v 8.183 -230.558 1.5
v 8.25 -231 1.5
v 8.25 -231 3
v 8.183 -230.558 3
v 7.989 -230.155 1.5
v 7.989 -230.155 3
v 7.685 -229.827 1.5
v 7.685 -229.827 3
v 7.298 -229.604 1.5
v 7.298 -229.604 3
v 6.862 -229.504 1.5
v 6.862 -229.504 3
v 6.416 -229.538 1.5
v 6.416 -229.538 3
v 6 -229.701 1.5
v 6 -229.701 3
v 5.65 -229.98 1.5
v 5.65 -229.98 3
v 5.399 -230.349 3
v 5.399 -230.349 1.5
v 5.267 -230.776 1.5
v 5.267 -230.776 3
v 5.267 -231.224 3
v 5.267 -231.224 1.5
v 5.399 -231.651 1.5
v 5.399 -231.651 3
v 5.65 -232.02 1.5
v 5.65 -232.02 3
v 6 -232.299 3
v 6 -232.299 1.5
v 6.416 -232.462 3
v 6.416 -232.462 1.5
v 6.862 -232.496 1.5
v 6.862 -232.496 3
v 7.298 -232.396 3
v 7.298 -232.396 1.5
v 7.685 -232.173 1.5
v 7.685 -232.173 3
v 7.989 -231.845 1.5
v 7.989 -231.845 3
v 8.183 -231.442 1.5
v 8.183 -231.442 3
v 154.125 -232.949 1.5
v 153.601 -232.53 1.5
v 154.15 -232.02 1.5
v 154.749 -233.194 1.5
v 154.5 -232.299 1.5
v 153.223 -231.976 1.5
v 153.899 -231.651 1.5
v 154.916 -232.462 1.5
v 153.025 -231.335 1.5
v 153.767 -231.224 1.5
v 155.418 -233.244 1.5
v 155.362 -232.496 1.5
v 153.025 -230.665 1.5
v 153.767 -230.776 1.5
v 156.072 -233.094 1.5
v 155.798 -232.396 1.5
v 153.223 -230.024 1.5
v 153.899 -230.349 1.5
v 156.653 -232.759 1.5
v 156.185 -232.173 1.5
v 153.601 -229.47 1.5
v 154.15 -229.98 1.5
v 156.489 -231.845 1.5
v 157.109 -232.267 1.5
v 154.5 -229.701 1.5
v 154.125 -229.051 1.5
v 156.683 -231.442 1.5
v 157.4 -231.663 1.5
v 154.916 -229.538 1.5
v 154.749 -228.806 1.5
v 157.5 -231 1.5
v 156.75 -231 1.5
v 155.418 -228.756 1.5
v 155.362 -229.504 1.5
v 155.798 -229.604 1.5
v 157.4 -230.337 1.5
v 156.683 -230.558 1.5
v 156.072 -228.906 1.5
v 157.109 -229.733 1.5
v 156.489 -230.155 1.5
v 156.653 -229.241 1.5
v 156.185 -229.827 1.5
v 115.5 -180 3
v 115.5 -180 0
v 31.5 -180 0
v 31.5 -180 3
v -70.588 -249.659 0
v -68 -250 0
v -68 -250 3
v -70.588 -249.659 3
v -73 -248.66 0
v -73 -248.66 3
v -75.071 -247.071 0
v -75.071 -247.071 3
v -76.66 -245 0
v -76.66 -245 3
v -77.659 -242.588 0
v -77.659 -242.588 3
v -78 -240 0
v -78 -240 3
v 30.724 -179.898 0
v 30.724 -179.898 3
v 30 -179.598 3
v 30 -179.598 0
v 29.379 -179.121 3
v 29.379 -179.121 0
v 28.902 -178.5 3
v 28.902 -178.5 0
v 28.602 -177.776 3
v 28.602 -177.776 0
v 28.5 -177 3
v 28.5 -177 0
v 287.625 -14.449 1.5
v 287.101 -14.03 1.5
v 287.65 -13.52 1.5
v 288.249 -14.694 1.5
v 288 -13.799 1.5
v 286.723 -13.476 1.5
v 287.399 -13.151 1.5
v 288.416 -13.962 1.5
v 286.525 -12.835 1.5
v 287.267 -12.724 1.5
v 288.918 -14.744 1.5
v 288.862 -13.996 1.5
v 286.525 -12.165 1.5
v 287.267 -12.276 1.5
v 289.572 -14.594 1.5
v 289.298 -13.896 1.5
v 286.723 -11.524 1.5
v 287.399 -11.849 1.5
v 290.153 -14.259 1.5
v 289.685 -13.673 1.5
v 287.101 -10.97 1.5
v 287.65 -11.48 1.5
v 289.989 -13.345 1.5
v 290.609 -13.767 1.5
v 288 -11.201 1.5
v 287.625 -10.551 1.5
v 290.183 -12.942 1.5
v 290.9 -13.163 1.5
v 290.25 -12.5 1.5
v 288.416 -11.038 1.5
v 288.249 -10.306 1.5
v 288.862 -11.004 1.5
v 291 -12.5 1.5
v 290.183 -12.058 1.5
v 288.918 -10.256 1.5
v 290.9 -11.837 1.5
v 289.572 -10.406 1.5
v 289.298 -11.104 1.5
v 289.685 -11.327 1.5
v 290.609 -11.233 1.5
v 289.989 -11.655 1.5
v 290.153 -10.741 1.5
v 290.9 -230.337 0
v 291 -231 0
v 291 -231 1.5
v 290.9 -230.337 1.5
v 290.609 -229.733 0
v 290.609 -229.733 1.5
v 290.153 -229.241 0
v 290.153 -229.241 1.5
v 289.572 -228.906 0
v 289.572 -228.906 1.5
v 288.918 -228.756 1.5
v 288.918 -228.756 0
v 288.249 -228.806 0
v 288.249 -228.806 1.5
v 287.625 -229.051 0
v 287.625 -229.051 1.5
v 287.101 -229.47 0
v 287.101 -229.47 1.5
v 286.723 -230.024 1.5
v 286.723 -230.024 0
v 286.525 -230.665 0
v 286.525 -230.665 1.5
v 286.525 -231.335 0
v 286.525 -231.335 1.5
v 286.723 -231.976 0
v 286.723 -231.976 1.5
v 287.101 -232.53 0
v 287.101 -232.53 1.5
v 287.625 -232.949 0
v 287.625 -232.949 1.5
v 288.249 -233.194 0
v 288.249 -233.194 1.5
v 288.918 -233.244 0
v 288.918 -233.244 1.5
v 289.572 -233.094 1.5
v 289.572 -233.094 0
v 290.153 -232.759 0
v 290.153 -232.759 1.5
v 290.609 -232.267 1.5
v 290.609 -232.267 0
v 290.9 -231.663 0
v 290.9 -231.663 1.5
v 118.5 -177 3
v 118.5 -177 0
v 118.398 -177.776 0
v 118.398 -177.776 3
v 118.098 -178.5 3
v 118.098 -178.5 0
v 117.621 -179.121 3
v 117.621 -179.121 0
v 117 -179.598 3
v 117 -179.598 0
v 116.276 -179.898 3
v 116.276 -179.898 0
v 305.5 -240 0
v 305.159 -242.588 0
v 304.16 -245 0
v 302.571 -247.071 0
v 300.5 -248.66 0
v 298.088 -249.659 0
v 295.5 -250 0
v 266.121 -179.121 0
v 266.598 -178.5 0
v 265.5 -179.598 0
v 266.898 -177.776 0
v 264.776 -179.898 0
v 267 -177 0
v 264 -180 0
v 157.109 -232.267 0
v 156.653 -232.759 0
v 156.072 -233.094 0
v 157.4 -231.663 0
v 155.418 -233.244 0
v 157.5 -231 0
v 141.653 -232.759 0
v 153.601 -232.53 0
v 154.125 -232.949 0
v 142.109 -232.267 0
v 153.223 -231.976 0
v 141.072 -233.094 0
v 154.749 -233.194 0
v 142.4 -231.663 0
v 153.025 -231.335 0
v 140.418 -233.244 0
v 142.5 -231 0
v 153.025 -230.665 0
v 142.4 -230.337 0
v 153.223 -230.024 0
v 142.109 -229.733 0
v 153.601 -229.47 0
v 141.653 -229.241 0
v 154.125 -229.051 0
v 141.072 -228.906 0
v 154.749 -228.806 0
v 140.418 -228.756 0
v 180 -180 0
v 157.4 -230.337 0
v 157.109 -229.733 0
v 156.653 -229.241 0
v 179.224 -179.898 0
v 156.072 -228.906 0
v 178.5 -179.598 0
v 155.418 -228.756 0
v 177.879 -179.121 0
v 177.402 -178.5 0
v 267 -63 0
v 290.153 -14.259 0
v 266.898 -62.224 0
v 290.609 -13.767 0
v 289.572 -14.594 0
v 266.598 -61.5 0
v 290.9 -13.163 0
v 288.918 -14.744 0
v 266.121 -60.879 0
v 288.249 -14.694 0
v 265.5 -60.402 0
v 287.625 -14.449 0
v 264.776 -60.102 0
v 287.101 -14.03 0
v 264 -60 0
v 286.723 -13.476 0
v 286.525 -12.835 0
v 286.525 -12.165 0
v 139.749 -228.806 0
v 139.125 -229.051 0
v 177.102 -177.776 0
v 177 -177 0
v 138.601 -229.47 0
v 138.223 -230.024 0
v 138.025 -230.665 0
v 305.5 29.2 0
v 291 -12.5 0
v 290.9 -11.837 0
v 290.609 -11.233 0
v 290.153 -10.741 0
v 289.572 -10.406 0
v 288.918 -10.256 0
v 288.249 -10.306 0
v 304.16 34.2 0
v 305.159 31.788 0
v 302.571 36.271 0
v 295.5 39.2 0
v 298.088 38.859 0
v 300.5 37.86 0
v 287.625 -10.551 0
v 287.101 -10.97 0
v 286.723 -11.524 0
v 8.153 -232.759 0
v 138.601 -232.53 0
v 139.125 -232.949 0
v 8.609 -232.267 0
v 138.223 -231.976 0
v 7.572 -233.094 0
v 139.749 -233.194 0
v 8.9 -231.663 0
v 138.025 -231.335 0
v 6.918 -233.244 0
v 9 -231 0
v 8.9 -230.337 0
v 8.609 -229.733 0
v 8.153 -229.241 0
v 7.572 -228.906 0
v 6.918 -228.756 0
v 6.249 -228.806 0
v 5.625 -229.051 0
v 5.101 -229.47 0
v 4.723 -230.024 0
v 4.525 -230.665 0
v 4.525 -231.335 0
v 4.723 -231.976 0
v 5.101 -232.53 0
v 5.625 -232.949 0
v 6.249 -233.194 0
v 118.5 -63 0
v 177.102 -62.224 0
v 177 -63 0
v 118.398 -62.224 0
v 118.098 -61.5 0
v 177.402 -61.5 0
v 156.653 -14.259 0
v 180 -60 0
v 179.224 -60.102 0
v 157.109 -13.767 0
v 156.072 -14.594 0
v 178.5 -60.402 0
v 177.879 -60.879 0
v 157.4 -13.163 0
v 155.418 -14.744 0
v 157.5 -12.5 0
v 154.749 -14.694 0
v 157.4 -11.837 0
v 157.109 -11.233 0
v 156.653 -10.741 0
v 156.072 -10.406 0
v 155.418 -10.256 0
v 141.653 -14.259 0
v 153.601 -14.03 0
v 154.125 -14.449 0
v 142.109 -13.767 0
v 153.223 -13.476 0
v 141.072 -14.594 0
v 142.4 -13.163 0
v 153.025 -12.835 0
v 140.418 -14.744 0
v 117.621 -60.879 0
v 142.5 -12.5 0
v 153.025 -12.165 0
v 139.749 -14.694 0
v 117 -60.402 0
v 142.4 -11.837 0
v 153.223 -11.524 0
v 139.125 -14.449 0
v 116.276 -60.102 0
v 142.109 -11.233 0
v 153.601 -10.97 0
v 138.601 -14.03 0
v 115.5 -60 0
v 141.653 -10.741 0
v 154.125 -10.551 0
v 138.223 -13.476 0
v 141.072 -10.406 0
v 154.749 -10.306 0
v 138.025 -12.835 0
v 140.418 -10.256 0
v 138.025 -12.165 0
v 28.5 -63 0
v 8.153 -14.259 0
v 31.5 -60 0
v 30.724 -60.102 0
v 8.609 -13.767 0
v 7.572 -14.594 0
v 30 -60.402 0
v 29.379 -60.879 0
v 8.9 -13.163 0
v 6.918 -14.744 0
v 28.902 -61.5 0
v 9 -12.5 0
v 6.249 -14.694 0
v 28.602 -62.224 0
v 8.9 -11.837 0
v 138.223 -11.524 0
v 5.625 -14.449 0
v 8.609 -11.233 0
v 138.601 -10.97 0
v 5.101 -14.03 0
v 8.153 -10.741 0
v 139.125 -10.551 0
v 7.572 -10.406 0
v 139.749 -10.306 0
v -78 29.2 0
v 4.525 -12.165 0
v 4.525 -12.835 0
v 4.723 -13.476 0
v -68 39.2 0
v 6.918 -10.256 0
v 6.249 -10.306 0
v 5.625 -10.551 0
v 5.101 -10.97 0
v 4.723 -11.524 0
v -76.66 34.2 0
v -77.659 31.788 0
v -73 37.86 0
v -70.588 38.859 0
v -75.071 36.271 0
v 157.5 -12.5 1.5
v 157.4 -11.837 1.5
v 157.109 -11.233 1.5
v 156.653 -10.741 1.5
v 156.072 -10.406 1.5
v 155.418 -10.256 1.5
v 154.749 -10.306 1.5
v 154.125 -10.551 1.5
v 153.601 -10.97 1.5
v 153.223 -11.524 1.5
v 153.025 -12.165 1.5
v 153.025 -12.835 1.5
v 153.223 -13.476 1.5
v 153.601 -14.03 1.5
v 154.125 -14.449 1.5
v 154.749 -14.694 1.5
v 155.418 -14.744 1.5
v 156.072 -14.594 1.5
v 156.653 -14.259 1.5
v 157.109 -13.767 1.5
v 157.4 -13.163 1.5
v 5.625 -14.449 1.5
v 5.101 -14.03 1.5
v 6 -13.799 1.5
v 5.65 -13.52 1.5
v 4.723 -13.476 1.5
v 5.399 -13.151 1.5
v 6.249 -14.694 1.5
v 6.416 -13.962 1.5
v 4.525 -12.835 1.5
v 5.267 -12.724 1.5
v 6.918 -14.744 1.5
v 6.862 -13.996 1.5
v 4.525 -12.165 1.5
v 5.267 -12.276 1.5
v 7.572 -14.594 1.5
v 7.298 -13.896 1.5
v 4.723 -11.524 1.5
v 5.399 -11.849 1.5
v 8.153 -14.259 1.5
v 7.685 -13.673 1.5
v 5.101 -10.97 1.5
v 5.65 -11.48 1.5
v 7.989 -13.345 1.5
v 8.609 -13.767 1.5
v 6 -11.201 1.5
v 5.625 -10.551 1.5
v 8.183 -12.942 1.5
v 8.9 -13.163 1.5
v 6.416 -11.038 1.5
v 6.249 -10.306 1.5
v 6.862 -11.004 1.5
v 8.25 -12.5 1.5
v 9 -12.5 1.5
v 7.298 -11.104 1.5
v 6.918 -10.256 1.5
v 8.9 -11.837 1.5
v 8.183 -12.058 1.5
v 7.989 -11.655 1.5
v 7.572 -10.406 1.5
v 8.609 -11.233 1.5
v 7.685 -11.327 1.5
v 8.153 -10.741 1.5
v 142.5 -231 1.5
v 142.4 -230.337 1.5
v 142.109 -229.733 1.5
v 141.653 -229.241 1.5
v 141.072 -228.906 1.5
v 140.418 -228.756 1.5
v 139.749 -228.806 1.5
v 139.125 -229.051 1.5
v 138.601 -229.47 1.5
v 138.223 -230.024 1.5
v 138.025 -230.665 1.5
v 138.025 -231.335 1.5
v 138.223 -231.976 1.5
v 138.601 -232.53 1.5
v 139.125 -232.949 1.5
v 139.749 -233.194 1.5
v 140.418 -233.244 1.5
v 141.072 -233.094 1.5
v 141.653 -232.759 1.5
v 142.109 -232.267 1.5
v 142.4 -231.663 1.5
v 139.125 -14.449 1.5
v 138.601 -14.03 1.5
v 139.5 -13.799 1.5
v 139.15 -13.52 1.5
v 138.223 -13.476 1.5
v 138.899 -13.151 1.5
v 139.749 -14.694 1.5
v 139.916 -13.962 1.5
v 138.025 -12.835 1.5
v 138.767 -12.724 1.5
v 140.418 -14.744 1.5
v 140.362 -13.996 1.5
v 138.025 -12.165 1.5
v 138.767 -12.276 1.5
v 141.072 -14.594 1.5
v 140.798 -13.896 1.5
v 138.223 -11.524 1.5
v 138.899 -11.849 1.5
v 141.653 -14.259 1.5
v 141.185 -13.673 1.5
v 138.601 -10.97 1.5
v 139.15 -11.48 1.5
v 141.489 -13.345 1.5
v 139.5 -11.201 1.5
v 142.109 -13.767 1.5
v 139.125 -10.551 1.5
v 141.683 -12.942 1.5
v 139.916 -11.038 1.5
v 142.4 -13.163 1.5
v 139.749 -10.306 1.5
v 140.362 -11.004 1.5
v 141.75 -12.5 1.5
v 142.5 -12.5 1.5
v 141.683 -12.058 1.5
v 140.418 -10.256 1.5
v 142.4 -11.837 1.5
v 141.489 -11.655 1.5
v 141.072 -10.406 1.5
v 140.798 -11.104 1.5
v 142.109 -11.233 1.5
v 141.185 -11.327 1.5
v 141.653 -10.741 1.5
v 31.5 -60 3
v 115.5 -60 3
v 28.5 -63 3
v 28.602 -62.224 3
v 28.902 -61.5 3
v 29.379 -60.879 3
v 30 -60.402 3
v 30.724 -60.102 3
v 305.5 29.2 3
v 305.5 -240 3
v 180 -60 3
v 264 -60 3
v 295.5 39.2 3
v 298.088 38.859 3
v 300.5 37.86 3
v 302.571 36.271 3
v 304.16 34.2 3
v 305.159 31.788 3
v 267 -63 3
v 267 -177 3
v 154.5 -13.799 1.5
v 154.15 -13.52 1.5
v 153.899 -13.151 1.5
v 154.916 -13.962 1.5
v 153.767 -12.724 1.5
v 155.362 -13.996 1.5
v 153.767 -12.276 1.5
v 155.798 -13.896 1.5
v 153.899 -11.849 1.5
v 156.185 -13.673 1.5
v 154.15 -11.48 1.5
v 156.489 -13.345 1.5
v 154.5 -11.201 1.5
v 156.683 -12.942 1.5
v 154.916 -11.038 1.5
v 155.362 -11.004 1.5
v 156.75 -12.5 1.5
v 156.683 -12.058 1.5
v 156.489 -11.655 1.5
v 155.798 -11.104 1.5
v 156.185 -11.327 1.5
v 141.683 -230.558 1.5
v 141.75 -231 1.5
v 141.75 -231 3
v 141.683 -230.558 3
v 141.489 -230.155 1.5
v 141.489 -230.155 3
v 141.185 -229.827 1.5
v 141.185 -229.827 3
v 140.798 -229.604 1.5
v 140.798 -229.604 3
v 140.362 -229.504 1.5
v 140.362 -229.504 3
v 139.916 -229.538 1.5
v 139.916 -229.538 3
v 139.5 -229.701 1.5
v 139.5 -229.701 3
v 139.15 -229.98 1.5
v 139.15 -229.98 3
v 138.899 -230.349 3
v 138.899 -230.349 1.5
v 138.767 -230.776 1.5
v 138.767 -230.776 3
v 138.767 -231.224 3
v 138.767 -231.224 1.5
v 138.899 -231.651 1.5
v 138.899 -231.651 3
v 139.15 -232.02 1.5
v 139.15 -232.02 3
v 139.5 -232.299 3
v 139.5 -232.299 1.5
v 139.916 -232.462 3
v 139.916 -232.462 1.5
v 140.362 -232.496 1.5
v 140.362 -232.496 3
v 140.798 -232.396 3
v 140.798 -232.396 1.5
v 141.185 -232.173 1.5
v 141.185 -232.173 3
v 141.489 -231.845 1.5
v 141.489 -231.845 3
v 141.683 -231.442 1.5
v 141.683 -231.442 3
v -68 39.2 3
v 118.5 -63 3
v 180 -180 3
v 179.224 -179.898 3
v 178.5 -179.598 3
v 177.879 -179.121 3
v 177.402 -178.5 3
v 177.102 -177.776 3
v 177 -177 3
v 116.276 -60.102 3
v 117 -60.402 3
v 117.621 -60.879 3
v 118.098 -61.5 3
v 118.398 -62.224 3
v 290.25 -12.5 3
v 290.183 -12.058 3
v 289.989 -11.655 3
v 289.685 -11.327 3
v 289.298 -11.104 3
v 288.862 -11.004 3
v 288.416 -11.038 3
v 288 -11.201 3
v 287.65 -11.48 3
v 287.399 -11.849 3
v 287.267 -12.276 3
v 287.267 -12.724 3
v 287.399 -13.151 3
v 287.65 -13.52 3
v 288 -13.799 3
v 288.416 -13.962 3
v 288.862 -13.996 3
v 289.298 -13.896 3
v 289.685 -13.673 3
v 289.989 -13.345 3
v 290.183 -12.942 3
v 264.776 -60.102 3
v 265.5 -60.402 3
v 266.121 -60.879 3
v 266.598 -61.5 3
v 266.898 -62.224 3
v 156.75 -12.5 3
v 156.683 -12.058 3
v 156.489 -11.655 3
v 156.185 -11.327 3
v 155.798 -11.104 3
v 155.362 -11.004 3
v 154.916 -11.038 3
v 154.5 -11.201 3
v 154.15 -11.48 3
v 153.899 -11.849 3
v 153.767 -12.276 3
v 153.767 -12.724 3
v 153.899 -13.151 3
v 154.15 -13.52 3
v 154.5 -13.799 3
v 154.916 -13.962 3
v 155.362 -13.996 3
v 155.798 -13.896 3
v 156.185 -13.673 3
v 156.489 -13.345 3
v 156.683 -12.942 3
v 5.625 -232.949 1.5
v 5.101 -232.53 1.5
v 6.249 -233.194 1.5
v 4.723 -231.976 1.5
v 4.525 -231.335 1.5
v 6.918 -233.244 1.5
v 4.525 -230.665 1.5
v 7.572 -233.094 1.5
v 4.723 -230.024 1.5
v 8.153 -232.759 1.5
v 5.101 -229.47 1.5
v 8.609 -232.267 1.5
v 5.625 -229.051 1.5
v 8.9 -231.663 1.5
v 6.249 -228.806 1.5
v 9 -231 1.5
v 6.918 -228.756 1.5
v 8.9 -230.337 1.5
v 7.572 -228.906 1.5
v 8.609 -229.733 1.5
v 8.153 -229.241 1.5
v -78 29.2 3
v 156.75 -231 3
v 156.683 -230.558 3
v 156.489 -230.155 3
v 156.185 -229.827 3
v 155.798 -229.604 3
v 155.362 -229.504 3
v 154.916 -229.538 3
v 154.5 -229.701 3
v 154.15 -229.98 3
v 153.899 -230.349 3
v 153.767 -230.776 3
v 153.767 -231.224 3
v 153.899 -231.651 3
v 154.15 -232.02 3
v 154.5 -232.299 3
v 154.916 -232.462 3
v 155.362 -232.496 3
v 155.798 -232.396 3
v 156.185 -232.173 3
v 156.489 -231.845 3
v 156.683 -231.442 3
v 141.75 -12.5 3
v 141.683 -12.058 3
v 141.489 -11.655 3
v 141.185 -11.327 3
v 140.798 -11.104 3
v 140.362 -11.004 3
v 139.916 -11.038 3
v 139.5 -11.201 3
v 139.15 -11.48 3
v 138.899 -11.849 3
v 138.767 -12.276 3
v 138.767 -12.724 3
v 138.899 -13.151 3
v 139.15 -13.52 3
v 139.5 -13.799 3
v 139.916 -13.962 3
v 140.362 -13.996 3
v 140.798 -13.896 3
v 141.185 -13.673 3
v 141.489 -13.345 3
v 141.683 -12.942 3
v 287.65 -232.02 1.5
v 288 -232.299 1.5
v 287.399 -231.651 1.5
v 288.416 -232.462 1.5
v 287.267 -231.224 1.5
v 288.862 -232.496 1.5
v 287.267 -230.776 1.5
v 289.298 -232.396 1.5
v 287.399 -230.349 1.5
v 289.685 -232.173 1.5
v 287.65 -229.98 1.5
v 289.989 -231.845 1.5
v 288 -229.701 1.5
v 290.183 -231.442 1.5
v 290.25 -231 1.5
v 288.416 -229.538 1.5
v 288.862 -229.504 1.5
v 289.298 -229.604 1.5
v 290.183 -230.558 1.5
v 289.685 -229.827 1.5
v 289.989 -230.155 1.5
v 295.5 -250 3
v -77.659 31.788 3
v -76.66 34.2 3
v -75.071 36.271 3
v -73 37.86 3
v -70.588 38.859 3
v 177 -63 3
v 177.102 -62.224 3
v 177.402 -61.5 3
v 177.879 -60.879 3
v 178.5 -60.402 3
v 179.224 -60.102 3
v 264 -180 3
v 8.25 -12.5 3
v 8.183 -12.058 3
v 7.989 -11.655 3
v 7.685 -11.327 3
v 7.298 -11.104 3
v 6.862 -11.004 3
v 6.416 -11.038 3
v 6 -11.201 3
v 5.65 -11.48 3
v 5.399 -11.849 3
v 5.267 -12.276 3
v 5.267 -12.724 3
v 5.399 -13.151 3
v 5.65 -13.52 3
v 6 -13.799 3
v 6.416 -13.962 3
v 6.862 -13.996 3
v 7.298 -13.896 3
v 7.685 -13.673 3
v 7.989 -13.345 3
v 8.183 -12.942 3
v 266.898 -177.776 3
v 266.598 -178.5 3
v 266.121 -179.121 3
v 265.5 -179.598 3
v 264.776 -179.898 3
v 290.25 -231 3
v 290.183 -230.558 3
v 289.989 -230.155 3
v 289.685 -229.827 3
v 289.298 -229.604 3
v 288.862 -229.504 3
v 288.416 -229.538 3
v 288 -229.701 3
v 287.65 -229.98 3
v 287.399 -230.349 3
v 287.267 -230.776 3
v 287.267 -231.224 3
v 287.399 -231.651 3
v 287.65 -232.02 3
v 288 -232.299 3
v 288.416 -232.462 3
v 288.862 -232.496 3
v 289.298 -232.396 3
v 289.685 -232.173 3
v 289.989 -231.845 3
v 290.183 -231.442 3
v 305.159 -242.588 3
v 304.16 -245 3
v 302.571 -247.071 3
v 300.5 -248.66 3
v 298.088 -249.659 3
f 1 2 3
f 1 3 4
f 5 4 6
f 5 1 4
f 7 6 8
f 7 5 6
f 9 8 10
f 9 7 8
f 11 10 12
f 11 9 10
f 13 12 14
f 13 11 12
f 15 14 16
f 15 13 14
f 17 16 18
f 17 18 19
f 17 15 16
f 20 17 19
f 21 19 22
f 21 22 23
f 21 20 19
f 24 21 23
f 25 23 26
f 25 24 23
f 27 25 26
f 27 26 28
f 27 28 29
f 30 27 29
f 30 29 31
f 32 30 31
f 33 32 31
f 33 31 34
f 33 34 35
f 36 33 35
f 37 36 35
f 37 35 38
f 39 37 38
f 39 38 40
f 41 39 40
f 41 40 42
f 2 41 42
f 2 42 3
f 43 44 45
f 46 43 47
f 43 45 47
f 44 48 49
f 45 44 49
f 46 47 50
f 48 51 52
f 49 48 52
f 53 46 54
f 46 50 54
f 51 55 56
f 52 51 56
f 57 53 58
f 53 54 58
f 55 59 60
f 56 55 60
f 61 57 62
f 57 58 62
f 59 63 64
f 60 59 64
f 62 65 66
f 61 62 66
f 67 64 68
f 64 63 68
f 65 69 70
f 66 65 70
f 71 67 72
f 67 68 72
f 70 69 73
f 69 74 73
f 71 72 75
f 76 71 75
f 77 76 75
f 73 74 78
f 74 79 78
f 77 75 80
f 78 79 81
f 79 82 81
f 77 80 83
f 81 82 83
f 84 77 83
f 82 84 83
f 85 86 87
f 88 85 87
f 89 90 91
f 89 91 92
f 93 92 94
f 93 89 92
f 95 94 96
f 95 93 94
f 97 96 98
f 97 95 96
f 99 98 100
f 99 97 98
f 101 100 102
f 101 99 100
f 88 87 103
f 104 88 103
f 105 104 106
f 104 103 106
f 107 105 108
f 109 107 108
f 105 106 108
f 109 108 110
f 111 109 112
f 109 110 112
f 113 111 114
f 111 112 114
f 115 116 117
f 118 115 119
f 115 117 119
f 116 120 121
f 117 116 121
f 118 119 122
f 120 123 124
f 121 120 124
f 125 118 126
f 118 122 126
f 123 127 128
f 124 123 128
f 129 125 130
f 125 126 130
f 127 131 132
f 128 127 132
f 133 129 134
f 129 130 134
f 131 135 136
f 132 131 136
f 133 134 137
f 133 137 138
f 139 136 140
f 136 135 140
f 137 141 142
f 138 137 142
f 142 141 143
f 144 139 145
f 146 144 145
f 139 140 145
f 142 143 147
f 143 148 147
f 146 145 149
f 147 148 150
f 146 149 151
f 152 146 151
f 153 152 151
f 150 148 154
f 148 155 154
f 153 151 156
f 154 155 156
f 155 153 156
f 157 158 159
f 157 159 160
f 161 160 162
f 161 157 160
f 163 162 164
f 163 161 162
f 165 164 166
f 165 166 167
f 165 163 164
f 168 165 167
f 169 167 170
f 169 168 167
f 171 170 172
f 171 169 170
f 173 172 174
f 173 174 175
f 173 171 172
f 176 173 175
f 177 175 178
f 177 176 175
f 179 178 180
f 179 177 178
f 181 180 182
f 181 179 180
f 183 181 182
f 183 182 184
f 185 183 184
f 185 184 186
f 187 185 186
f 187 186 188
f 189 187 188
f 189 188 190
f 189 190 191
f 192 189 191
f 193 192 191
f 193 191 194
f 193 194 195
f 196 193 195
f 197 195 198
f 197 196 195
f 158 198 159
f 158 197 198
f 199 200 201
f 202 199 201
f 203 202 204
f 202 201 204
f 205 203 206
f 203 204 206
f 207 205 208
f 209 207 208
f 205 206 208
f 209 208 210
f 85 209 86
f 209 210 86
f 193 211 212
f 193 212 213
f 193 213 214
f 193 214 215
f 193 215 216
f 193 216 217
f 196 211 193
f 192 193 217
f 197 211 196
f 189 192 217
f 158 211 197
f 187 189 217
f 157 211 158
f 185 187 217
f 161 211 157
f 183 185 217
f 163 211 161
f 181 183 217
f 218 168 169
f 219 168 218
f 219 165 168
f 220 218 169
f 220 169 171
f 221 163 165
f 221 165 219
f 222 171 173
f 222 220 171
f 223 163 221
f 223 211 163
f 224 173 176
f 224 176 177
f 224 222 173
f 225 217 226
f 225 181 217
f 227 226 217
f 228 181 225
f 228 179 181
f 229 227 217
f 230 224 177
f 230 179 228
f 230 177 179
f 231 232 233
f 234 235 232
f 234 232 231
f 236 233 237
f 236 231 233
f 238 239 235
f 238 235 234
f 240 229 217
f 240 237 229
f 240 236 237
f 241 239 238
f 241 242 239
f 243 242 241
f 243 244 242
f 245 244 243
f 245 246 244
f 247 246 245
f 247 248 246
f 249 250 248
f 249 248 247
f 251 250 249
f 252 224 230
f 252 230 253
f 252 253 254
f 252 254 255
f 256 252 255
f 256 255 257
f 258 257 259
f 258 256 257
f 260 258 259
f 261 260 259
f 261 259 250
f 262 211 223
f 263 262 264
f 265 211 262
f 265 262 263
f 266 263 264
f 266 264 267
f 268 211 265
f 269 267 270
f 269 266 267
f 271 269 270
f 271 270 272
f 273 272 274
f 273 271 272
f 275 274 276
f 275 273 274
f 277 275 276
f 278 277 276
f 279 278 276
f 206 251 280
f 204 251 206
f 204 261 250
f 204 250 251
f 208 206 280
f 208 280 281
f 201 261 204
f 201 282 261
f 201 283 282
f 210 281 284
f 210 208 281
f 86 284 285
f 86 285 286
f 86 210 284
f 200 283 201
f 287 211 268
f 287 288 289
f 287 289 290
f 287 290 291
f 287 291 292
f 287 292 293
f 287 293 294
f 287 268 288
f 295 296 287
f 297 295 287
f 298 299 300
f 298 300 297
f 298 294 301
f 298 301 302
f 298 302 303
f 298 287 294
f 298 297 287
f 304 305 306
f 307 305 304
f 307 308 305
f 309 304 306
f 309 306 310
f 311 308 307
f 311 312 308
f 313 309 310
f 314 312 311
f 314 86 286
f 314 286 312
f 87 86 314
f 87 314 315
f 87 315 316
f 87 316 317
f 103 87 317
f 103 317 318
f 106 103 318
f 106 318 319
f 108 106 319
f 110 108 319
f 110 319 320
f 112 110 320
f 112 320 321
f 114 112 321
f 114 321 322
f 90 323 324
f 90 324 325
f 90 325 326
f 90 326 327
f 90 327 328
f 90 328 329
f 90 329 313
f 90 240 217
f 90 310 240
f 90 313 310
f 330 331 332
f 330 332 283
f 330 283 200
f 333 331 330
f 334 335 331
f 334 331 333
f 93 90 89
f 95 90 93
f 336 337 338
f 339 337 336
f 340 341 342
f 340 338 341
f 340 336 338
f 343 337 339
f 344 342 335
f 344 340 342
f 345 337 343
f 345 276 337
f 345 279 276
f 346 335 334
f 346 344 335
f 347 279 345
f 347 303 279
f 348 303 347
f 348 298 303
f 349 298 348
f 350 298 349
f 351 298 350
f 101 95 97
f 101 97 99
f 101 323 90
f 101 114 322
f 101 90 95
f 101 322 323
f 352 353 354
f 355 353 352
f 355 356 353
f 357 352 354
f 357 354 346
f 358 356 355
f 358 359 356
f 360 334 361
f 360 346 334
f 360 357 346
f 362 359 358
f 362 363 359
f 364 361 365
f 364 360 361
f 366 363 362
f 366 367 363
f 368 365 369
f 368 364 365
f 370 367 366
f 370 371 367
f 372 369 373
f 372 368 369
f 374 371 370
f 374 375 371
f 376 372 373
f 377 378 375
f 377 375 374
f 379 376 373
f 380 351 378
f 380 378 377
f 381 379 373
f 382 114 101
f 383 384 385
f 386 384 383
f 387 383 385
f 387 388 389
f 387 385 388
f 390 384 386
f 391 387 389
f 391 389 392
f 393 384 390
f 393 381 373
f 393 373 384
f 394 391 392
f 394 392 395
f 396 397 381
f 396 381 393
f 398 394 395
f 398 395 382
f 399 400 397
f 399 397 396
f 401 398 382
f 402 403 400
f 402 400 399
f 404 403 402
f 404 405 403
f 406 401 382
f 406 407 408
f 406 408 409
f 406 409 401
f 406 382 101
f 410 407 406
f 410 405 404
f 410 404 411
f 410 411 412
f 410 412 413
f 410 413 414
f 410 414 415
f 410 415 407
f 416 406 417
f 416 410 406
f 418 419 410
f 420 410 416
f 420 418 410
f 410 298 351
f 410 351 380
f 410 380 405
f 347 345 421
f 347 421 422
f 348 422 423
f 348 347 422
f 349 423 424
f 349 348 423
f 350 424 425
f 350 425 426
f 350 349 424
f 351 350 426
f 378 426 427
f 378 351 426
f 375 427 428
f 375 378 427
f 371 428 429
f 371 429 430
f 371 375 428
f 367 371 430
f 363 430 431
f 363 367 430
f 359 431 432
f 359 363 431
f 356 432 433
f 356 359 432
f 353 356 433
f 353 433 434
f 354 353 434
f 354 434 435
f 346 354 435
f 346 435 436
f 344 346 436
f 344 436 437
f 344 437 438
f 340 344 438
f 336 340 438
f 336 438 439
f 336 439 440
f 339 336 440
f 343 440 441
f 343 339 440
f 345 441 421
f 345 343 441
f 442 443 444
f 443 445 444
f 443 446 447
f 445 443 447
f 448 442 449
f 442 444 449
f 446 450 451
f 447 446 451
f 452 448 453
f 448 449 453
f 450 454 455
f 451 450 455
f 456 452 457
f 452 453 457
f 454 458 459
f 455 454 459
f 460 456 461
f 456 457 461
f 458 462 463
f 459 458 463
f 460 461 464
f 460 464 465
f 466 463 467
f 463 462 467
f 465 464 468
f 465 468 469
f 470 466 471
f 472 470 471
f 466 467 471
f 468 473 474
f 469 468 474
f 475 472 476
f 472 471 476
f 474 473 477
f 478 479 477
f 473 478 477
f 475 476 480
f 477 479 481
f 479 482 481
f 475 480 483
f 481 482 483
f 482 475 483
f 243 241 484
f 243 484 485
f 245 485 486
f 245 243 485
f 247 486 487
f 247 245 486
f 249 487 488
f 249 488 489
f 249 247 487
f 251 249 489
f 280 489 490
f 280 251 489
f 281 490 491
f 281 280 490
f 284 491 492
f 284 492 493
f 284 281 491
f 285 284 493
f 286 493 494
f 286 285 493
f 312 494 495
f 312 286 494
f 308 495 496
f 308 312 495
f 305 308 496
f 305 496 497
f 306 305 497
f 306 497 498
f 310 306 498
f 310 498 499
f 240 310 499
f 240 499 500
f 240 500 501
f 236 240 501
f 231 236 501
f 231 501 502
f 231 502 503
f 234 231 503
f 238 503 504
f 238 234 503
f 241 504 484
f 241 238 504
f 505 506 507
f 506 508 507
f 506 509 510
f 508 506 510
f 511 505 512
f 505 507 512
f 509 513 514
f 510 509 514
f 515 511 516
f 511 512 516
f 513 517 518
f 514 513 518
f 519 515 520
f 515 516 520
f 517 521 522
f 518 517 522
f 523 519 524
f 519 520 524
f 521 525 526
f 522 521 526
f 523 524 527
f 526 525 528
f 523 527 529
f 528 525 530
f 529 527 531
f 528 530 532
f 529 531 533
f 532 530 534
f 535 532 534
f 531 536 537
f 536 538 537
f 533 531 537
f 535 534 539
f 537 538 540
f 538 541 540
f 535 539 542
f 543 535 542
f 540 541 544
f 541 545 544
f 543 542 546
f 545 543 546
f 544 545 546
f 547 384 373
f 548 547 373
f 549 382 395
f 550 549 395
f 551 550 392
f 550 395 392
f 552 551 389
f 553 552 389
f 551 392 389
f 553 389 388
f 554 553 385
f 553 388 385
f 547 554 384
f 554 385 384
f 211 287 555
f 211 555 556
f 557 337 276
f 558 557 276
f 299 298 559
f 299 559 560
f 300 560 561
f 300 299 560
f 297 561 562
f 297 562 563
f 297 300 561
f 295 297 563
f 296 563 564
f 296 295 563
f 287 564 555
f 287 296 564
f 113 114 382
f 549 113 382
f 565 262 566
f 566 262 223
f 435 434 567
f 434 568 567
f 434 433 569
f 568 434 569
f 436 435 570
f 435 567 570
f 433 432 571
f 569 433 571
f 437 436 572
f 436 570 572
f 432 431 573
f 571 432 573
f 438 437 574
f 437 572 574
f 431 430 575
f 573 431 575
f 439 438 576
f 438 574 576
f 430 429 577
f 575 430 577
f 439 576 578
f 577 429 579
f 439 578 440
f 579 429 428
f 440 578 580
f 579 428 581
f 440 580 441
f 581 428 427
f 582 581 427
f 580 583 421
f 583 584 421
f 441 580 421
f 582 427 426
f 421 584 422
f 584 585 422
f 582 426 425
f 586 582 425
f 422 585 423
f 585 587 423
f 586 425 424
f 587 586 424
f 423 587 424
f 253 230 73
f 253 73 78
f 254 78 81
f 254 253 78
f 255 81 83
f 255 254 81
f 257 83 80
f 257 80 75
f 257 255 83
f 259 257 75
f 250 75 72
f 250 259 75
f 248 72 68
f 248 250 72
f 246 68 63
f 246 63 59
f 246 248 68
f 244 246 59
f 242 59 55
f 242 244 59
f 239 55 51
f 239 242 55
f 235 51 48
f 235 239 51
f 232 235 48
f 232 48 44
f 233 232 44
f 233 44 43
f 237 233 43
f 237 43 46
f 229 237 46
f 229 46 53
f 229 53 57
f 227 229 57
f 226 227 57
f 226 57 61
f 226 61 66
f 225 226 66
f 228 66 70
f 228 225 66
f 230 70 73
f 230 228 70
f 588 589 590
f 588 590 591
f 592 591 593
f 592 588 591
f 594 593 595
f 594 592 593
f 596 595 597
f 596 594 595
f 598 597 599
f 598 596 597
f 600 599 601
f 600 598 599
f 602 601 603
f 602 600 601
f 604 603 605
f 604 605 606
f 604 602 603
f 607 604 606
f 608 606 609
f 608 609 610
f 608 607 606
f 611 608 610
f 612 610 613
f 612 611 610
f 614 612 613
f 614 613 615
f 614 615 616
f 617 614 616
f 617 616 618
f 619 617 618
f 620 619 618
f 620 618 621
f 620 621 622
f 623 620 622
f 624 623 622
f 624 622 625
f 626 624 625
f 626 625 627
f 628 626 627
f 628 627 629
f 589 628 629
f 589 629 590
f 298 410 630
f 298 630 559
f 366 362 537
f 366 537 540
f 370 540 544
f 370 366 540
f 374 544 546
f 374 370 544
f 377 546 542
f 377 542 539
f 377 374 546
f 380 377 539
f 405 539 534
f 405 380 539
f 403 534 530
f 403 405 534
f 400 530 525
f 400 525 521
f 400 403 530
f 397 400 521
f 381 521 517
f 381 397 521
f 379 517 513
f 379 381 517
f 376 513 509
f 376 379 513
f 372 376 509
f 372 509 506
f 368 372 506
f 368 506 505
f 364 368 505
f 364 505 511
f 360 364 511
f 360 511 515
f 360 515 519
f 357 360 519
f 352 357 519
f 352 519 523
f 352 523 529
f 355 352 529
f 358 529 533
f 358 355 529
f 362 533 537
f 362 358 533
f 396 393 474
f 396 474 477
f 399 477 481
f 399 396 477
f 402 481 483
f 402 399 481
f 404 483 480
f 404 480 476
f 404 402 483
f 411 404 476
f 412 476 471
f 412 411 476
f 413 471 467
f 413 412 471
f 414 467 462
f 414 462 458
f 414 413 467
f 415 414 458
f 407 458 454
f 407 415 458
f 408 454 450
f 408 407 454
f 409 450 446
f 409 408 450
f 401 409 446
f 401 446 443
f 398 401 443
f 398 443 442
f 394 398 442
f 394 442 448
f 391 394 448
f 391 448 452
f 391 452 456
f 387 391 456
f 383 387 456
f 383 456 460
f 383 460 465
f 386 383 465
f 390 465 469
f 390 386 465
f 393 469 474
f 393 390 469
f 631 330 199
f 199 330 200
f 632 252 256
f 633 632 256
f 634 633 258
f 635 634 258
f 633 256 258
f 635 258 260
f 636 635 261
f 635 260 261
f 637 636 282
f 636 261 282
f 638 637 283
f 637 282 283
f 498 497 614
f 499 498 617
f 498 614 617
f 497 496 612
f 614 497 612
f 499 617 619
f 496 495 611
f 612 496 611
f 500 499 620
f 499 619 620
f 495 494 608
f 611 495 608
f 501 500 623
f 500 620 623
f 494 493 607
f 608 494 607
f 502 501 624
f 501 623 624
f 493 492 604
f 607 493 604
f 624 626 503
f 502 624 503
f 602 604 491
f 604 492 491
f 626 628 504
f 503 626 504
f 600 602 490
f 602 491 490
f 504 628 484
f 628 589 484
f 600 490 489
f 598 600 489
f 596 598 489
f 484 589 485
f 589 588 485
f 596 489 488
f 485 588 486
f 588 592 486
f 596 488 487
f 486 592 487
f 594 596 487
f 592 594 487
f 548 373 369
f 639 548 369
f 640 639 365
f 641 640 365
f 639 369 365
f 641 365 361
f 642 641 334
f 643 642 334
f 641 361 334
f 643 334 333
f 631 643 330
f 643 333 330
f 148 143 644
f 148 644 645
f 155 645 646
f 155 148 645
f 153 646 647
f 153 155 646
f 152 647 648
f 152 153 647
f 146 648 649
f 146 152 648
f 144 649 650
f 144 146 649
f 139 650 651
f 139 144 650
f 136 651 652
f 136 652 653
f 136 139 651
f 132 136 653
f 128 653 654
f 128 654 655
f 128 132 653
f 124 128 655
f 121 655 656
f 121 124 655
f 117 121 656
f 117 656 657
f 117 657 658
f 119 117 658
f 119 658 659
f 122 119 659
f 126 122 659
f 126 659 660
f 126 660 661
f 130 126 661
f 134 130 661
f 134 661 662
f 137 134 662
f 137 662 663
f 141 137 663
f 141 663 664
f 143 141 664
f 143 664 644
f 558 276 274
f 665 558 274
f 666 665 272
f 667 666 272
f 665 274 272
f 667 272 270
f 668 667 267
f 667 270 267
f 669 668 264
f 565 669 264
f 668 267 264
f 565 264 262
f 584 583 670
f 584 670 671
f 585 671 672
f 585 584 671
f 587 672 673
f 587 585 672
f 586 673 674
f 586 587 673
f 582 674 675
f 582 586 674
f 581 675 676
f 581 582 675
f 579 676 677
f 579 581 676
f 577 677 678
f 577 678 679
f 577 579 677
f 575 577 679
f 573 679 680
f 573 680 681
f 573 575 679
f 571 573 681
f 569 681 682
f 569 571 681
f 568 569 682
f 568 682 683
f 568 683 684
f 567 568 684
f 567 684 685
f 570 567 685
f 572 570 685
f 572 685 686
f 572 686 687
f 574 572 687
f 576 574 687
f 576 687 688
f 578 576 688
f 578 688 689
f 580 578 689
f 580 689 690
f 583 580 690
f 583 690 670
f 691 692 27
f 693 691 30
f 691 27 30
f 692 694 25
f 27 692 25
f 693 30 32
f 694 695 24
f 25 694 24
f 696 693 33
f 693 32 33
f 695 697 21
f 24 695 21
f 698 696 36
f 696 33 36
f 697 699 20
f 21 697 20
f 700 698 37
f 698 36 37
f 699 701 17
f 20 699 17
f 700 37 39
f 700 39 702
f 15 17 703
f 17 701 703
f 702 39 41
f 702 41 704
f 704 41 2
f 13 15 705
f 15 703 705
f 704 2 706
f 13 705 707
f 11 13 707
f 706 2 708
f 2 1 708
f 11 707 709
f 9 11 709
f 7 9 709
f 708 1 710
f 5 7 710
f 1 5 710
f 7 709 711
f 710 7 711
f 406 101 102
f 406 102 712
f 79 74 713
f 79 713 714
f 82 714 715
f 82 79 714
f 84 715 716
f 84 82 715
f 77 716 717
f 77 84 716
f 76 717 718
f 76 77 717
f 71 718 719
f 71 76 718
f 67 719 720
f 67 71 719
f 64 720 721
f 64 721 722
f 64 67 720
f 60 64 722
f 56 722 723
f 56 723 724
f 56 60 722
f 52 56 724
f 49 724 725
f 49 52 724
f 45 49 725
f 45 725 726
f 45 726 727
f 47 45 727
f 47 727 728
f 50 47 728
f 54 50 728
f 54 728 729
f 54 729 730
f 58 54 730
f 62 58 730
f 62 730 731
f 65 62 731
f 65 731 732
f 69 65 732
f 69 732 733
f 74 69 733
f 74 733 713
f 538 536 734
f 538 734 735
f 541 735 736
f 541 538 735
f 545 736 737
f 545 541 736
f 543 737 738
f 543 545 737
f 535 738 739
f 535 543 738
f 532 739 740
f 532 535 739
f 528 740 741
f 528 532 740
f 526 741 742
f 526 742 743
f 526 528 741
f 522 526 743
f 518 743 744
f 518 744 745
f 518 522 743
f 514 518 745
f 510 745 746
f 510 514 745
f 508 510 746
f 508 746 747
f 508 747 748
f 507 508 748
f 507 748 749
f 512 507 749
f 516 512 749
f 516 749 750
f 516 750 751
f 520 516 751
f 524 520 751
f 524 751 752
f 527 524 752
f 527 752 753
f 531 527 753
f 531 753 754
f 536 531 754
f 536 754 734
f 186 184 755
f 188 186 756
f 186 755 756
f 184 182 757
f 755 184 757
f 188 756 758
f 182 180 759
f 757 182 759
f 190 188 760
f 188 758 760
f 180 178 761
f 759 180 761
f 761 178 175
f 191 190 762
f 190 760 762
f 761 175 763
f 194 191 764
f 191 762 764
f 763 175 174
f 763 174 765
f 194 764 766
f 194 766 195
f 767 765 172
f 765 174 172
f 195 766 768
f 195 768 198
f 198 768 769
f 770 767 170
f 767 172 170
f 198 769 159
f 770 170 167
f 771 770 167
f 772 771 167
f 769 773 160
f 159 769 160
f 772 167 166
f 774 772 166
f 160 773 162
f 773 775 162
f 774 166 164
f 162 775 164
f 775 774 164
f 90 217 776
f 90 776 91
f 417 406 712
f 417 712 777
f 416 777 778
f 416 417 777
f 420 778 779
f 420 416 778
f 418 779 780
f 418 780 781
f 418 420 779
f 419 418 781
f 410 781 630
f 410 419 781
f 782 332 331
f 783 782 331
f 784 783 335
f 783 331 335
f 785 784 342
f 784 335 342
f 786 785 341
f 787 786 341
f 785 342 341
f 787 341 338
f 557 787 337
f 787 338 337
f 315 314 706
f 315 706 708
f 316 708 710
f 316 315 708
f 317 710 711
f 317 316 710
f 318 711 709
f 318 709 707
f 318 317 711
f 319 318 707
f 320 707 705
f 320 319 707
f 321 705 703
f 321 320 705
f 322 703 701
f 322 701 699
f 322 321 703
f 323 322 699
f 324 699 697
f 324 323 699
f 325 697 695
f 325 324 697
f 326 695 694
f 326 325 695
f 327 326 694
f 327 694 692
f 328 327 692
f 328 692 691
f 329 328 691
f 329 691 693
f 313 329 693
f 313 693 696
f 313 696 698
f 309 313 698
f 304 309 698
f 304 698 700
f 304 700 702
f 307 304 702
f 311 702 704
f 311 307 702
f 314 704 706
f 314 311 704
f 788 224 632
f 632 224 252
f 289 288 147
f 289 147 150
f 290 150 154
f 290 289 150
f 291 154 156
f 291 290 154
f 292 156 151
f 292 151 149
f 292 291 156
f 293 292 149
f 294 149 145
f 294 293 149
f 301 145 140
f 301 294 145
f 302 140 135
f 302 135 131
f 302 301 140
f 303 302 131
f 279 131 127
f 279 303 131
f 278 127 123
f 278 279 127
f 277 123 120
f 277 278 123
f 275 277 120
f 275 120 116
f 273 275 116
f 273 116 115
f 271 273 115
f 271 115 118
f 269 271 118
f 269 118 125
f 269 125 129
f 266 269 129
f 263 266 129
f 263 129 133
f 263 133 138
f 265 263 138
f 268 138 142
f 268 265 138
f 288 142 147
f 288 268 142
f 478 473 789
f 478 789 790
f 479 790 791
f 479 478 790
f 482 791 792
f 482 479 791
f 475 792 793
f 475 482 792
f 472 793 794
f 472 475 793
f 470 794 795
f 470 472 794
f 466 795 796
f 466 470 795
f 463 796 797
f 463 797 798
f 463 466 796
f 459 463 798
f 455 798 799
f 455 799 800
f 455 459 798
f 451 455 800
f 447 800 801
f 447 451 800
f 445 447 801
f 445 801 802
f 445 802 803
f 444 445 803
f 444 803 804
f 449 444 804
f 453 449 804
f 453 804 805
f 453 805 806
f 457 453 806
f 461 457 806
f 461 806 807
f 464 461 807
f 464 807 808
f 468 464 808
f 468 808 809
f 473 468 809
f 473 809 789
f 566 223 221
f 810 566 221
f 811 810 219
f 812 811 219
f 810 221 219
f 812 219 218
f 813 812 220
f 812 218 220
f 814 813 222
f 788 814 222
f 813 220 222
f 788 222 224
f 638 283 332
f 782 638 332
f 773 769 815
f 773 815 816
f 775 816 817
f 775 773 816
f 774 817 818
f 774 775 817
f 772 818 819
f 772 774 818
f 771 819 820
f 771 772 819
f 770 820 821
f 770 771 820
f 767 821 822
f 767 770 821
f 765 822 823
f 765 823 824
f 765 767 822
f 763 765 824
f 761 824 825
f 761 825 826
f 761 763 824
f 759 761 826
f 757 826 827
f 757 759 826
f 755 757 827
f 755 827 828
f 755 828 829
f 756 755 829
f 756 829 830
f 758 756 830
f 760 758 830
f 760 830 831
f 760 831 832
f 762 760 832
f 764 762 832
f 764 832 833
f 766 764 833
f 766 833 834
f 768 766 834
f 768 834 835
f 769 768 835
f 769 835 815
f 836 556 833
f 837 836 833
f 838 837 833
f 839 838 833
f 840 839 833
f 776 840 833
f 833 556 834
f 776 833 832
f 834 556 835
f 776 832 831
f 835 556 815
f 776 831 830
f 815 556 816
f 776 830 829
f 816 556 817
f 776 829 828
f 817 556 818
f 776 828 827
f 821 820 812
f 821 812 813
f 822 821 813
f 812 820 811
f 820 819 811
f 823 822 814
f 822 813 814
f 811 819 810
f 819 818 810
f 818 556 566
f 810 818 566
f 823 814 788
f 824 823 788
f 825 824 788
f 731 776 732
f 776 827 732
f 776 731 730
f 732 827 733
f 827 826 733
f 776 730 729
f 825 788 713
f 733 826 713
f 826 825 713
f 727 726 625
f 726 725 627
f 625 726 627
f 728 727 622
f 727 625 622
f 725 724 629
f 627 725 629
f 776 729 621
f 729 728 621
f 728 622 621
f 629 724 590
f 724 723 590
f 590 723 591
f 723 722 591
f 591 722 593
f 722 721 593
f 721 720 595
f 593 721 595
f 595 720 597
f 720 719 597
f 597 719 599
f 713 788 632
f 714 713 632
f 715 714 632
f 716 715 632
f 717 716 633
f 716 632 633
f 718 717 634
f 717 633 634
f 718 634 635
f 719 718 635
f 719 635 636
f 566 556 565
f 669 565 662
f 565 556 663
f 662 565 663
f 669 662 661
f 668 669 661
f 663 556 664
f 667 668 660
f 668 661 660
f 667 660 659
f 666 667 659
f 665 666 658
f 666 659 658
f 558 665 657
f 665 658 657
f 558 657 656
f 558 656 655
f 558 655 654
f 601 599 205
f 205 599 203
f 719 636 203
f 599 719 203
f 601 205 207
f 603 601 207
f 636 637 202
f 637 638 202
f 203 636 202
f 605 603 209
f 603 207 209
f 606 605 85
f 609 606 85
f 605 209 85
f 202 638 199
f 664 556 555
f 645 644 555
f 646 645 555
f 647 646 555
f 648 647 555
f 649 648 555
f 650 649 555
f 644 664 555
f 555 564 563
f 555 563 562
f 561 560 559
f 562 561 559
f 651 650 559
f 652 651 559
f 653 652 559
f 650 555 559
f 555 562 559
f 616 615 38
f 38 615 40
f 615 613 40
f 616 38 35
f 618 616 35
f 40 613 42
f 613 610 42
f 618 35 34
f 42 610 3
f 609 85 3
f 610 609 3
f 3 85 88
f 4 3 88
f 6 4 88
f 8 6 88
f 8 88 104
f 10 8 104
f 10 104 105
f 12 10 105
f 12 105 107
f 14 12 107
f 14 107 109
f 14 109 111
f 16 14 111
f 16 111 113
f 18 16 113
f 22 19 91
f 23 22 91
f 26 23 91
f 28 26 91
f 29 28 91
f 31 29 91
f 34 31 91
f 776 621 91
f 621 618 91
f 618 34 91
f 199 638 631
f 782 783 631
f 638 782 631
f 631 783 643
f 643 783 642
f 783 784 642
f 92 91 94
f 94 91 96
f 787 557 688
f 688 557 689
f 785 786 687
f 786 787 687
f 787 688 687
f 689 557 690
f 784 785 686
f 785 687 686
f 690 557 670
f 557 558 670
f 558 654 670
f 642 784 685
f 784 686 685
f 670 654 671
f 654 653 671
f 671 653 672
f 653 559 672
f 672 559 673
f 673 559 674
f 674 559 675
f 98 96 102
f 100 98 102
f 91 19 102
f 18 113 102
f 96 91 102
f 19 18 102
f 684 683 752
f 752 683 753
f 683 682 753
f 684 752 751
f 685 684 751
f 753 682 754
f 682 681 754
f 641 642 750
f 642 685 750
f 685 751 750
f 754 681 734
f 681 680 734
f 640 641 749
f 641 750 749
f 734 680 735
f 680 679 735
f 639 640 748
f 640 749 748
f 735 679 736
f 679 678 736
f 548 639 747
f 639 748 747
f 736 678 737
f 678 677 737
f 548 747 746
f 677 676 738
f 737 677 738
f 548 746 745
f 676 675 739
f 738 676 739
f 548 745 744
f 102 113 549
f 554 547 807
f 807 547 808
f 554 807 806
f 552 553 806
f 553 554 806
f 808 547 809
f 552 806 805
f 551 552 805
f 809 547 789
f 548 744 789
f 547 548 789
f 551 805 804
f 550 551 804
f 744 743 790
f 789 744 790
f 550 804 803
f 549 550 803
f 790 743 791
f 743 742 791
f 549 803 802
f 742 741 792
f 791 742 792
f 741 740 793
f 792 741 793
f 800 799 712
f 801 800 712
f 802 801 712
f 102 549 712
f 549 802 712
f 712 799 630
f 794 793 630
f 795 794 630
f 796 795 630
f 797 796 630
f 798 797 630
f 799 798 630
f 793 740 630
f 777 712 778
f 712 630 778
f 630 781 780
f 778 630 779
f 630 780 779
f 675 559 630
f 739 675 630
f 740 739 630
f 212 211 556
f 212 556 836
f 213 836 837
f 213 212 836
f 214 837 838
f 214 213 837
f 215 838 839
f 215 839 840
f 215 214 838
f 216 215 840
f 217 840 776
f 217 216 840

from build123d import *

# Parameters (mm, degrees)
EXTRUDE_1_DEPTH     = 3
SKETCH_1_3_R        = 2.25
CUT_EXTRUDE_1_DEPTH = 1.5
SKETCH_1_4_R        = 1.5
CUT_EXTRUDE_2_DEPTH = 3


with BuildPart() as part:
    # 草图1 → 凸台-拉伸1 (new body)
    with BuildSketch(Plane.XY):
        with BuildLine():
            Line((-68, 39.2), (295.5, 39.2))
            ThreePointArc((295.5, 39.2), (302.571067812, 36.271067812), (305.5, 29.2))
            Line((305.5, 29.2), (305.5, -240))
            ThreePointArc((305.5, -240), (302.571067812, -247.071067812), (295.5, -250))
            Line((295.5, -250), (-68, -250))
            ThreePointArc((-68, -250), (-75.071067812, -247.071067812), (-78, -240))
            Line((-78, -240), (-78, 29.2))
            ThreePointArc((-78, 29.2), (-75.071067812, 36.271067812), (-68, 39.2))
        make_face()
    extrude(amount=EXTRUDE_1_DEPTH)

    # 草图1<3> → 切除-拉伸1 (cut)
    with BuildSketch(Plane.XY):
        with Locations((6.75, -12.5)):
            Circle(SKETCH_1_3_R)
        with Locations((140.25, -12.5)):
            Circle(SKETCH_1_3_R)
        with Locations((140.25, -231)):
            Circle(SKETCH_1_3_R)
        with Locations((6.75, -231)):
            Circle(SKETCH_1_3_R)
        with Locations((155.25, -12.5)):
            Circle(SKETCH_1_3_R)
        with Locations((288.75, -12.5)):
            Circle(SKETCH_1_3_R)
        with Locations((288.75, -231)):
            Circle(SKETCH_1_3_R)
        with Locations((155.25, -231)):
            Circle(SKETCH_1_3_R)
    extrude(amount=CUT_EXTRUDE_1_DEPTH, mode=Mode.SUBTRACT)

    # 草图1<4> → 切除-拉伸2 (cut)
    with BuildSketch(Plane.XY):
        with Locations((6.75, -12.5)):
            Circle(SKETCH_1_4_R)
        with Locations((140.25, -12.5)):
            Circle(SKETCH_1_4_R)
        with Locations((140.25, -231)):
            Circle(SKETCH_1_4_R)
        with Locations((6.75, -231)):
            Circle(SKETCH_1_4_R)
        with Locations((155.25, -12.5)):
            Circle(SKETCH_1_4_R)
        with Locations((288.75, -12.5)):
            Circle(SKETCH_1_4_R)
        with Locations((288.75, -231)):
            Circle(SKETCH_1_4_R)
        with Locations((155.25, -231)):
            Circle(SKETCH_1_4_R)
        with BuildLine():
            Line((31.5, -60), (115.5, -60))
            ThreePointArc((115.5, -60), (117.621320344, -60.878679656), (118.5, -63))
            Line((118.5, -63), (118.5, -177))
            ThreePointArc((118.5, -177), (117.621320344, -179.121320344), (115.5, -180))
            Line((115.5, -180), (31.5, -180))
            ThreePointArc((31.5, -180), (29.378679656, -179.121320344), (28.5, -177))
            Line((28.5, -177), (28.5, -63))
            ThreePointArc((28.5, -63), (29.378679656, -60.878679656), (31.5, -60))
        make_face()
        with BuildLine():
            Line((180, -60), (264, -60))
            ThreePointArc((264, -60), (266.121320344, -60.878679656), (267, -63))
            Line((267, -63), (267, -177))
            ThreePointArc((267, -177), (266.121320344, -179.121320344), (264, -180))
            Line((264, -180), (180, -180))
            ThreePointArc((180, -180), (177.878679656, -179.121320344), (177, -177))
            Line((177, -177), (177, -63))
            ThreePointArc((177, -63), (177.878679656, -60.878679656), (180, -60))
        make_face()
    extrude(amount=CUT_EXTRUDE_2_DEPTH, mode=Mode.SUBTRACT)


solid = part.part
